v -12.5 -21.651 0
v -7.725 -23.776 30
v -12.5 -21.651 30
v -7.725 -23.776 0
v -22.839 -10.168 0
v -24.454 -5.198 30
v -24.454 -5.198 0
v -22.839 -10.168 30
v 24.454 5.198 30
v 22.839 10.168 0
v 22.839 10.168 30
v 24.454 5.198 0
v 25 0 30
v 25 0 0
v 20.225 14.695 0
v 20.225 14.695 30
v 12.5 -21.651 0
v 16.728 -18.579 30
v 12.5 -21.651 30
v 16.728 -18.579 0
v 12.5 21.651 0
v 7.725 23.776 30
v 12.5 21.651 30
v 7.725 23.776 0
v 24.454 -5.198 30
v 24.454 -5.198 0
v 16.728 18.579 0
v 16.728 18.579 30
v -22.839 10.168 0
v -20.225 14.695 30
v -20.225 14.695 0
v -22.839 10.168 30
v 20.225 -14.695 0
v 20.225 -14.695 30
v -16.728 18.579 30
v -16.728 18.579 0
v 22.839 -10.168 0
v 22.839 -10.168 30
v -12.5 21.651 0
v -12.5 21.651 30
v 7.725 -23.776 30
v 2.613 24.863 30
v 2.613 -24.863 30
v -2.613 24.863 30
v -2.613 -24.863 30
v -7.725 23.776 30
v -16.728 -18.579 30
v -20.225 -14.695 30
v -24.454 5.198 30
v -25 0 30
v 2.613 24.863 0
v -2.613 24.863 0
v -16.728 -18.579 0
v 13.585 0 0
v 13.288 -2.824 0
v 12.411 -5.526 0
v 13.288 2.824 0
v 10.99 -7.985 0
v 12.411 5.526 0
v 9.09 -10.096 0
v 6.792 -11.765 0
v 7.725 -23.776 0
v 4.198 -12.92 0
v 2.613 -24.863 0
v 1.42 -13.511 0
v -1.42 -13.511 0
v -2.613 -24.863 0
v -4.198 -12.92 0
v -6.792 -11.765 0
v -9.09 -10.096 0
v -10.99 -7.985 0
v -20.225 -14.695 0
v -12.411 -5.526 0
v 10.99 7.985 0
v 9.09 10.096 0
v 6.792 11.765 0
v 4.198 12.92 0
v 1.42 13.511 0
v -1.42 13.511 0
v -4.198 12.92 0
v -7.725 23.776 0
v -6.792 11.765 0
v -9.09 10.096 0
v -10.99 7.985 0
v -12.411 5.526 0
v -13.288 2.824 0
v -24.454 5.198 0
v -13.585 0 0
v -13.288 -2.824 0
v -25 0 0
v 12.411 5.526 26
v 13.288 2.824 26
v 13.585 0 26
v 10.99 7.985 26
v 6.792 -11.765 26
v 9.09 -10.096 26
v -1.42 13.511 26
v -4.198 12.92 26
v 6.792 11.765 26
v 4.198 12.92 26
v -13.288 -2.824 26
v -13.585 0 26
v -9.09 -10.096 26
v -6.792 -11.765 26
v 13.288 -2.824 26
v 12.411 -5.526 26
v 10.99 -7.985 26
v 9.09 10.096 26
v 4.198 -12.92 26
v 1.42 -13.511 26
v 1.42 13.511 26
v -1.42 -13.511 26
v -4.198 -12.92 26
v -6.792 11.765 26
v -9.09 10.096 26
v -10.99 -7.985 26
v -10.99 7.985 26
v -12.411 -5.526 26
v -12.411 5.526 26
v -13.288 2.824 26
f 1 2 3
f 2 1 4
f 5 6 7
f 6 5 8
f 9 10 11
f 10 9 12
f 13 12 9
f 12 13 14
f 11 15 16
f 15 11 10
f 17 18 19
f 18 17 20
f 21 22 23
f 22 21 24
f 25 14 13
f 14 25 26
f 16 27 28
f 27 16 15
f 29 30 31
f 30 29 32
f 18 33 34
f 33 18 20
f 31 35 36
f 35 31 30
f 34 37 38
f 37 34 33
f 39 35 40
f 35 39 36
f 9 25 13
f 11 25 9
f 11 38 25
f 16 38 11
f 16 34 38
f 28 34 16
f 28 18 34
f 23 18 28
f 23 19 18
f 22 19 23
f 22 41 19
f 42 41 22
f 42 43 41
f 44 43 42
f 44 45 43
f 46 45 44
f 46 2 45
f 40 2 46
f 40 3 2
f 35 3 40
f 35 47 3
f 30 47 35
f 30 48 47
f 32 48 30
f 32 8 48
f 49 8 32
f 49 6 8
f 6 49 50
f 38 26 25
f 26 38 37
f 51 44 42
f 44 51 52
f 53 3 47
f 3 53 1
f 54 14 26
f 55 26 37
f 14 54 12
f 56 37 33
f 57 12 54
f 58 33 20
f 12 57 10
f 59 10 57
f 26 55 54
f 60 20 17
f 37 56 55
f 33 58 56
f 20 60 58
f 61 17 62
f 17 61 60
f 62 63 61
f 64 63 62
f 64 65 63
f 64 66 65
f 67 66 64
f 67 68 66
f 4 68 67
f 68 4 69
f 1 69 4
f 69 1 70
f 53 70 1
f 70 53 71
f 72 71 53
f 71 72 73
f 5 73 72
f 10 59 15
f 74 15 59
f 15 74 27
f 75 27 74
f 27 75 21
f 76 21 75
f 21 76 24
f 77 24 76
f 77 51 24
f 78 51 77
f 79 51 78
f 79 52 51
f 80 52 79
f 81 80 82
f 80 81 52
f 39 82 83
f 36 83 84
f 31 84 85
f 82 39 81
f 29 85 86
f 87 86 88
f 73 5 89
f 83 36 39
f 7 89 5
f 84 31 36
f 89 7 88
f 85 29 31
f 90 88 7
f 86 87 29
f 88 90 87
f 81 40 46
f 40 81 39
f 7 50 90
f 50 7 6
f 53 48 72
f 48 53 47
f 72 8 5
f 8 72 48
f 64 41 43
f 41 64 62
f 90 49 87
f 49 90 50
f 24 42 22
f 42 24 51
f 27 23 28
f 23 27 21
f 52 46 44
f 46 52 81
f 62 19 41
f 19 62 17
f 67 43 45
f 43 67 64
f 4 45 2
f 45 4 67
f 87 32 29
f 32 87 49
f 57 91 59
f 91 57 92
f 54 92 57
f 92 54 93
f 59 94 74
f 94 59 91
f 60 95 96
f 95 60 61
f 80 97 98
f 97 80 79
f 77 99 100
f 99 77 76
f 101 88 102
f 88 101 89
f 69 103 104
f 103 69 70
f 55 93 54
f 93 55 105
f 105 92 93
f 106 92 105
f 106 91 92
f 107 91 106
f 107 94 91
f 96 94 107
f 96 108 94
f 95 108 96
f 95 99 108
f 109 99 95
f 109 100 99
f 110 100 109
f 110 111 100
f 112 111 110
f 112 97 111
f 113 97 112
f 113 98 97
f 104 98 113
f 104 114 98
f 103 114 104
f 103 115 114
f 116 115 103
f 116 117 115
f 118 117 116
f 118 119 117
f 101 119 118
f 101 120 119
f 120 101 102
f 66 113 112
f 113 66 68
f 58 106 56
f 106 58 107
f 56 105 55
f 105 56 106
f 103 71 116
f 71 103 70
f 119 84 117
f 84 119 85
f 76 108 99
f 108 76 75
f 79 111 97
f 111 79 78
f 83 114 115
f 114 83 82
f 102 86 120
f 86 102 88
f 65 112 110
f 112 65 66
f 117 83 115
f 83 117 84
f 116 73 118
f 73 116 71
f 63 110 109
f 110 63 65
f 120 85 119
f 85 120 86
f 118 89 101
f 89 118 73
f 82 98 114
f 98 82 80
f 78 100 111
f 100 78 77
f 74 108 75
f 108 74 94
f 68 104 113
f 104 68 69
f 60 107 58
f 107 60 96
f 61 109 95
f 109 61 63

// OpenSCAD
/*
3/4" PVC to Weather Station Mount Adapter

Created April 1, 2024
Modified April 1, 2024
*/

adapt_od = 50;
adapt_id = 1.05 * 25.4 + 0.5;

adapt_h = 30;
top_h = 2;

difference() {
    cylinder(d=adapt_od, h=adapt_h);
    translate([0, 0, -top_h])
        cylinder(d=adapt_id, h=adapt_h - top_h);
}   
